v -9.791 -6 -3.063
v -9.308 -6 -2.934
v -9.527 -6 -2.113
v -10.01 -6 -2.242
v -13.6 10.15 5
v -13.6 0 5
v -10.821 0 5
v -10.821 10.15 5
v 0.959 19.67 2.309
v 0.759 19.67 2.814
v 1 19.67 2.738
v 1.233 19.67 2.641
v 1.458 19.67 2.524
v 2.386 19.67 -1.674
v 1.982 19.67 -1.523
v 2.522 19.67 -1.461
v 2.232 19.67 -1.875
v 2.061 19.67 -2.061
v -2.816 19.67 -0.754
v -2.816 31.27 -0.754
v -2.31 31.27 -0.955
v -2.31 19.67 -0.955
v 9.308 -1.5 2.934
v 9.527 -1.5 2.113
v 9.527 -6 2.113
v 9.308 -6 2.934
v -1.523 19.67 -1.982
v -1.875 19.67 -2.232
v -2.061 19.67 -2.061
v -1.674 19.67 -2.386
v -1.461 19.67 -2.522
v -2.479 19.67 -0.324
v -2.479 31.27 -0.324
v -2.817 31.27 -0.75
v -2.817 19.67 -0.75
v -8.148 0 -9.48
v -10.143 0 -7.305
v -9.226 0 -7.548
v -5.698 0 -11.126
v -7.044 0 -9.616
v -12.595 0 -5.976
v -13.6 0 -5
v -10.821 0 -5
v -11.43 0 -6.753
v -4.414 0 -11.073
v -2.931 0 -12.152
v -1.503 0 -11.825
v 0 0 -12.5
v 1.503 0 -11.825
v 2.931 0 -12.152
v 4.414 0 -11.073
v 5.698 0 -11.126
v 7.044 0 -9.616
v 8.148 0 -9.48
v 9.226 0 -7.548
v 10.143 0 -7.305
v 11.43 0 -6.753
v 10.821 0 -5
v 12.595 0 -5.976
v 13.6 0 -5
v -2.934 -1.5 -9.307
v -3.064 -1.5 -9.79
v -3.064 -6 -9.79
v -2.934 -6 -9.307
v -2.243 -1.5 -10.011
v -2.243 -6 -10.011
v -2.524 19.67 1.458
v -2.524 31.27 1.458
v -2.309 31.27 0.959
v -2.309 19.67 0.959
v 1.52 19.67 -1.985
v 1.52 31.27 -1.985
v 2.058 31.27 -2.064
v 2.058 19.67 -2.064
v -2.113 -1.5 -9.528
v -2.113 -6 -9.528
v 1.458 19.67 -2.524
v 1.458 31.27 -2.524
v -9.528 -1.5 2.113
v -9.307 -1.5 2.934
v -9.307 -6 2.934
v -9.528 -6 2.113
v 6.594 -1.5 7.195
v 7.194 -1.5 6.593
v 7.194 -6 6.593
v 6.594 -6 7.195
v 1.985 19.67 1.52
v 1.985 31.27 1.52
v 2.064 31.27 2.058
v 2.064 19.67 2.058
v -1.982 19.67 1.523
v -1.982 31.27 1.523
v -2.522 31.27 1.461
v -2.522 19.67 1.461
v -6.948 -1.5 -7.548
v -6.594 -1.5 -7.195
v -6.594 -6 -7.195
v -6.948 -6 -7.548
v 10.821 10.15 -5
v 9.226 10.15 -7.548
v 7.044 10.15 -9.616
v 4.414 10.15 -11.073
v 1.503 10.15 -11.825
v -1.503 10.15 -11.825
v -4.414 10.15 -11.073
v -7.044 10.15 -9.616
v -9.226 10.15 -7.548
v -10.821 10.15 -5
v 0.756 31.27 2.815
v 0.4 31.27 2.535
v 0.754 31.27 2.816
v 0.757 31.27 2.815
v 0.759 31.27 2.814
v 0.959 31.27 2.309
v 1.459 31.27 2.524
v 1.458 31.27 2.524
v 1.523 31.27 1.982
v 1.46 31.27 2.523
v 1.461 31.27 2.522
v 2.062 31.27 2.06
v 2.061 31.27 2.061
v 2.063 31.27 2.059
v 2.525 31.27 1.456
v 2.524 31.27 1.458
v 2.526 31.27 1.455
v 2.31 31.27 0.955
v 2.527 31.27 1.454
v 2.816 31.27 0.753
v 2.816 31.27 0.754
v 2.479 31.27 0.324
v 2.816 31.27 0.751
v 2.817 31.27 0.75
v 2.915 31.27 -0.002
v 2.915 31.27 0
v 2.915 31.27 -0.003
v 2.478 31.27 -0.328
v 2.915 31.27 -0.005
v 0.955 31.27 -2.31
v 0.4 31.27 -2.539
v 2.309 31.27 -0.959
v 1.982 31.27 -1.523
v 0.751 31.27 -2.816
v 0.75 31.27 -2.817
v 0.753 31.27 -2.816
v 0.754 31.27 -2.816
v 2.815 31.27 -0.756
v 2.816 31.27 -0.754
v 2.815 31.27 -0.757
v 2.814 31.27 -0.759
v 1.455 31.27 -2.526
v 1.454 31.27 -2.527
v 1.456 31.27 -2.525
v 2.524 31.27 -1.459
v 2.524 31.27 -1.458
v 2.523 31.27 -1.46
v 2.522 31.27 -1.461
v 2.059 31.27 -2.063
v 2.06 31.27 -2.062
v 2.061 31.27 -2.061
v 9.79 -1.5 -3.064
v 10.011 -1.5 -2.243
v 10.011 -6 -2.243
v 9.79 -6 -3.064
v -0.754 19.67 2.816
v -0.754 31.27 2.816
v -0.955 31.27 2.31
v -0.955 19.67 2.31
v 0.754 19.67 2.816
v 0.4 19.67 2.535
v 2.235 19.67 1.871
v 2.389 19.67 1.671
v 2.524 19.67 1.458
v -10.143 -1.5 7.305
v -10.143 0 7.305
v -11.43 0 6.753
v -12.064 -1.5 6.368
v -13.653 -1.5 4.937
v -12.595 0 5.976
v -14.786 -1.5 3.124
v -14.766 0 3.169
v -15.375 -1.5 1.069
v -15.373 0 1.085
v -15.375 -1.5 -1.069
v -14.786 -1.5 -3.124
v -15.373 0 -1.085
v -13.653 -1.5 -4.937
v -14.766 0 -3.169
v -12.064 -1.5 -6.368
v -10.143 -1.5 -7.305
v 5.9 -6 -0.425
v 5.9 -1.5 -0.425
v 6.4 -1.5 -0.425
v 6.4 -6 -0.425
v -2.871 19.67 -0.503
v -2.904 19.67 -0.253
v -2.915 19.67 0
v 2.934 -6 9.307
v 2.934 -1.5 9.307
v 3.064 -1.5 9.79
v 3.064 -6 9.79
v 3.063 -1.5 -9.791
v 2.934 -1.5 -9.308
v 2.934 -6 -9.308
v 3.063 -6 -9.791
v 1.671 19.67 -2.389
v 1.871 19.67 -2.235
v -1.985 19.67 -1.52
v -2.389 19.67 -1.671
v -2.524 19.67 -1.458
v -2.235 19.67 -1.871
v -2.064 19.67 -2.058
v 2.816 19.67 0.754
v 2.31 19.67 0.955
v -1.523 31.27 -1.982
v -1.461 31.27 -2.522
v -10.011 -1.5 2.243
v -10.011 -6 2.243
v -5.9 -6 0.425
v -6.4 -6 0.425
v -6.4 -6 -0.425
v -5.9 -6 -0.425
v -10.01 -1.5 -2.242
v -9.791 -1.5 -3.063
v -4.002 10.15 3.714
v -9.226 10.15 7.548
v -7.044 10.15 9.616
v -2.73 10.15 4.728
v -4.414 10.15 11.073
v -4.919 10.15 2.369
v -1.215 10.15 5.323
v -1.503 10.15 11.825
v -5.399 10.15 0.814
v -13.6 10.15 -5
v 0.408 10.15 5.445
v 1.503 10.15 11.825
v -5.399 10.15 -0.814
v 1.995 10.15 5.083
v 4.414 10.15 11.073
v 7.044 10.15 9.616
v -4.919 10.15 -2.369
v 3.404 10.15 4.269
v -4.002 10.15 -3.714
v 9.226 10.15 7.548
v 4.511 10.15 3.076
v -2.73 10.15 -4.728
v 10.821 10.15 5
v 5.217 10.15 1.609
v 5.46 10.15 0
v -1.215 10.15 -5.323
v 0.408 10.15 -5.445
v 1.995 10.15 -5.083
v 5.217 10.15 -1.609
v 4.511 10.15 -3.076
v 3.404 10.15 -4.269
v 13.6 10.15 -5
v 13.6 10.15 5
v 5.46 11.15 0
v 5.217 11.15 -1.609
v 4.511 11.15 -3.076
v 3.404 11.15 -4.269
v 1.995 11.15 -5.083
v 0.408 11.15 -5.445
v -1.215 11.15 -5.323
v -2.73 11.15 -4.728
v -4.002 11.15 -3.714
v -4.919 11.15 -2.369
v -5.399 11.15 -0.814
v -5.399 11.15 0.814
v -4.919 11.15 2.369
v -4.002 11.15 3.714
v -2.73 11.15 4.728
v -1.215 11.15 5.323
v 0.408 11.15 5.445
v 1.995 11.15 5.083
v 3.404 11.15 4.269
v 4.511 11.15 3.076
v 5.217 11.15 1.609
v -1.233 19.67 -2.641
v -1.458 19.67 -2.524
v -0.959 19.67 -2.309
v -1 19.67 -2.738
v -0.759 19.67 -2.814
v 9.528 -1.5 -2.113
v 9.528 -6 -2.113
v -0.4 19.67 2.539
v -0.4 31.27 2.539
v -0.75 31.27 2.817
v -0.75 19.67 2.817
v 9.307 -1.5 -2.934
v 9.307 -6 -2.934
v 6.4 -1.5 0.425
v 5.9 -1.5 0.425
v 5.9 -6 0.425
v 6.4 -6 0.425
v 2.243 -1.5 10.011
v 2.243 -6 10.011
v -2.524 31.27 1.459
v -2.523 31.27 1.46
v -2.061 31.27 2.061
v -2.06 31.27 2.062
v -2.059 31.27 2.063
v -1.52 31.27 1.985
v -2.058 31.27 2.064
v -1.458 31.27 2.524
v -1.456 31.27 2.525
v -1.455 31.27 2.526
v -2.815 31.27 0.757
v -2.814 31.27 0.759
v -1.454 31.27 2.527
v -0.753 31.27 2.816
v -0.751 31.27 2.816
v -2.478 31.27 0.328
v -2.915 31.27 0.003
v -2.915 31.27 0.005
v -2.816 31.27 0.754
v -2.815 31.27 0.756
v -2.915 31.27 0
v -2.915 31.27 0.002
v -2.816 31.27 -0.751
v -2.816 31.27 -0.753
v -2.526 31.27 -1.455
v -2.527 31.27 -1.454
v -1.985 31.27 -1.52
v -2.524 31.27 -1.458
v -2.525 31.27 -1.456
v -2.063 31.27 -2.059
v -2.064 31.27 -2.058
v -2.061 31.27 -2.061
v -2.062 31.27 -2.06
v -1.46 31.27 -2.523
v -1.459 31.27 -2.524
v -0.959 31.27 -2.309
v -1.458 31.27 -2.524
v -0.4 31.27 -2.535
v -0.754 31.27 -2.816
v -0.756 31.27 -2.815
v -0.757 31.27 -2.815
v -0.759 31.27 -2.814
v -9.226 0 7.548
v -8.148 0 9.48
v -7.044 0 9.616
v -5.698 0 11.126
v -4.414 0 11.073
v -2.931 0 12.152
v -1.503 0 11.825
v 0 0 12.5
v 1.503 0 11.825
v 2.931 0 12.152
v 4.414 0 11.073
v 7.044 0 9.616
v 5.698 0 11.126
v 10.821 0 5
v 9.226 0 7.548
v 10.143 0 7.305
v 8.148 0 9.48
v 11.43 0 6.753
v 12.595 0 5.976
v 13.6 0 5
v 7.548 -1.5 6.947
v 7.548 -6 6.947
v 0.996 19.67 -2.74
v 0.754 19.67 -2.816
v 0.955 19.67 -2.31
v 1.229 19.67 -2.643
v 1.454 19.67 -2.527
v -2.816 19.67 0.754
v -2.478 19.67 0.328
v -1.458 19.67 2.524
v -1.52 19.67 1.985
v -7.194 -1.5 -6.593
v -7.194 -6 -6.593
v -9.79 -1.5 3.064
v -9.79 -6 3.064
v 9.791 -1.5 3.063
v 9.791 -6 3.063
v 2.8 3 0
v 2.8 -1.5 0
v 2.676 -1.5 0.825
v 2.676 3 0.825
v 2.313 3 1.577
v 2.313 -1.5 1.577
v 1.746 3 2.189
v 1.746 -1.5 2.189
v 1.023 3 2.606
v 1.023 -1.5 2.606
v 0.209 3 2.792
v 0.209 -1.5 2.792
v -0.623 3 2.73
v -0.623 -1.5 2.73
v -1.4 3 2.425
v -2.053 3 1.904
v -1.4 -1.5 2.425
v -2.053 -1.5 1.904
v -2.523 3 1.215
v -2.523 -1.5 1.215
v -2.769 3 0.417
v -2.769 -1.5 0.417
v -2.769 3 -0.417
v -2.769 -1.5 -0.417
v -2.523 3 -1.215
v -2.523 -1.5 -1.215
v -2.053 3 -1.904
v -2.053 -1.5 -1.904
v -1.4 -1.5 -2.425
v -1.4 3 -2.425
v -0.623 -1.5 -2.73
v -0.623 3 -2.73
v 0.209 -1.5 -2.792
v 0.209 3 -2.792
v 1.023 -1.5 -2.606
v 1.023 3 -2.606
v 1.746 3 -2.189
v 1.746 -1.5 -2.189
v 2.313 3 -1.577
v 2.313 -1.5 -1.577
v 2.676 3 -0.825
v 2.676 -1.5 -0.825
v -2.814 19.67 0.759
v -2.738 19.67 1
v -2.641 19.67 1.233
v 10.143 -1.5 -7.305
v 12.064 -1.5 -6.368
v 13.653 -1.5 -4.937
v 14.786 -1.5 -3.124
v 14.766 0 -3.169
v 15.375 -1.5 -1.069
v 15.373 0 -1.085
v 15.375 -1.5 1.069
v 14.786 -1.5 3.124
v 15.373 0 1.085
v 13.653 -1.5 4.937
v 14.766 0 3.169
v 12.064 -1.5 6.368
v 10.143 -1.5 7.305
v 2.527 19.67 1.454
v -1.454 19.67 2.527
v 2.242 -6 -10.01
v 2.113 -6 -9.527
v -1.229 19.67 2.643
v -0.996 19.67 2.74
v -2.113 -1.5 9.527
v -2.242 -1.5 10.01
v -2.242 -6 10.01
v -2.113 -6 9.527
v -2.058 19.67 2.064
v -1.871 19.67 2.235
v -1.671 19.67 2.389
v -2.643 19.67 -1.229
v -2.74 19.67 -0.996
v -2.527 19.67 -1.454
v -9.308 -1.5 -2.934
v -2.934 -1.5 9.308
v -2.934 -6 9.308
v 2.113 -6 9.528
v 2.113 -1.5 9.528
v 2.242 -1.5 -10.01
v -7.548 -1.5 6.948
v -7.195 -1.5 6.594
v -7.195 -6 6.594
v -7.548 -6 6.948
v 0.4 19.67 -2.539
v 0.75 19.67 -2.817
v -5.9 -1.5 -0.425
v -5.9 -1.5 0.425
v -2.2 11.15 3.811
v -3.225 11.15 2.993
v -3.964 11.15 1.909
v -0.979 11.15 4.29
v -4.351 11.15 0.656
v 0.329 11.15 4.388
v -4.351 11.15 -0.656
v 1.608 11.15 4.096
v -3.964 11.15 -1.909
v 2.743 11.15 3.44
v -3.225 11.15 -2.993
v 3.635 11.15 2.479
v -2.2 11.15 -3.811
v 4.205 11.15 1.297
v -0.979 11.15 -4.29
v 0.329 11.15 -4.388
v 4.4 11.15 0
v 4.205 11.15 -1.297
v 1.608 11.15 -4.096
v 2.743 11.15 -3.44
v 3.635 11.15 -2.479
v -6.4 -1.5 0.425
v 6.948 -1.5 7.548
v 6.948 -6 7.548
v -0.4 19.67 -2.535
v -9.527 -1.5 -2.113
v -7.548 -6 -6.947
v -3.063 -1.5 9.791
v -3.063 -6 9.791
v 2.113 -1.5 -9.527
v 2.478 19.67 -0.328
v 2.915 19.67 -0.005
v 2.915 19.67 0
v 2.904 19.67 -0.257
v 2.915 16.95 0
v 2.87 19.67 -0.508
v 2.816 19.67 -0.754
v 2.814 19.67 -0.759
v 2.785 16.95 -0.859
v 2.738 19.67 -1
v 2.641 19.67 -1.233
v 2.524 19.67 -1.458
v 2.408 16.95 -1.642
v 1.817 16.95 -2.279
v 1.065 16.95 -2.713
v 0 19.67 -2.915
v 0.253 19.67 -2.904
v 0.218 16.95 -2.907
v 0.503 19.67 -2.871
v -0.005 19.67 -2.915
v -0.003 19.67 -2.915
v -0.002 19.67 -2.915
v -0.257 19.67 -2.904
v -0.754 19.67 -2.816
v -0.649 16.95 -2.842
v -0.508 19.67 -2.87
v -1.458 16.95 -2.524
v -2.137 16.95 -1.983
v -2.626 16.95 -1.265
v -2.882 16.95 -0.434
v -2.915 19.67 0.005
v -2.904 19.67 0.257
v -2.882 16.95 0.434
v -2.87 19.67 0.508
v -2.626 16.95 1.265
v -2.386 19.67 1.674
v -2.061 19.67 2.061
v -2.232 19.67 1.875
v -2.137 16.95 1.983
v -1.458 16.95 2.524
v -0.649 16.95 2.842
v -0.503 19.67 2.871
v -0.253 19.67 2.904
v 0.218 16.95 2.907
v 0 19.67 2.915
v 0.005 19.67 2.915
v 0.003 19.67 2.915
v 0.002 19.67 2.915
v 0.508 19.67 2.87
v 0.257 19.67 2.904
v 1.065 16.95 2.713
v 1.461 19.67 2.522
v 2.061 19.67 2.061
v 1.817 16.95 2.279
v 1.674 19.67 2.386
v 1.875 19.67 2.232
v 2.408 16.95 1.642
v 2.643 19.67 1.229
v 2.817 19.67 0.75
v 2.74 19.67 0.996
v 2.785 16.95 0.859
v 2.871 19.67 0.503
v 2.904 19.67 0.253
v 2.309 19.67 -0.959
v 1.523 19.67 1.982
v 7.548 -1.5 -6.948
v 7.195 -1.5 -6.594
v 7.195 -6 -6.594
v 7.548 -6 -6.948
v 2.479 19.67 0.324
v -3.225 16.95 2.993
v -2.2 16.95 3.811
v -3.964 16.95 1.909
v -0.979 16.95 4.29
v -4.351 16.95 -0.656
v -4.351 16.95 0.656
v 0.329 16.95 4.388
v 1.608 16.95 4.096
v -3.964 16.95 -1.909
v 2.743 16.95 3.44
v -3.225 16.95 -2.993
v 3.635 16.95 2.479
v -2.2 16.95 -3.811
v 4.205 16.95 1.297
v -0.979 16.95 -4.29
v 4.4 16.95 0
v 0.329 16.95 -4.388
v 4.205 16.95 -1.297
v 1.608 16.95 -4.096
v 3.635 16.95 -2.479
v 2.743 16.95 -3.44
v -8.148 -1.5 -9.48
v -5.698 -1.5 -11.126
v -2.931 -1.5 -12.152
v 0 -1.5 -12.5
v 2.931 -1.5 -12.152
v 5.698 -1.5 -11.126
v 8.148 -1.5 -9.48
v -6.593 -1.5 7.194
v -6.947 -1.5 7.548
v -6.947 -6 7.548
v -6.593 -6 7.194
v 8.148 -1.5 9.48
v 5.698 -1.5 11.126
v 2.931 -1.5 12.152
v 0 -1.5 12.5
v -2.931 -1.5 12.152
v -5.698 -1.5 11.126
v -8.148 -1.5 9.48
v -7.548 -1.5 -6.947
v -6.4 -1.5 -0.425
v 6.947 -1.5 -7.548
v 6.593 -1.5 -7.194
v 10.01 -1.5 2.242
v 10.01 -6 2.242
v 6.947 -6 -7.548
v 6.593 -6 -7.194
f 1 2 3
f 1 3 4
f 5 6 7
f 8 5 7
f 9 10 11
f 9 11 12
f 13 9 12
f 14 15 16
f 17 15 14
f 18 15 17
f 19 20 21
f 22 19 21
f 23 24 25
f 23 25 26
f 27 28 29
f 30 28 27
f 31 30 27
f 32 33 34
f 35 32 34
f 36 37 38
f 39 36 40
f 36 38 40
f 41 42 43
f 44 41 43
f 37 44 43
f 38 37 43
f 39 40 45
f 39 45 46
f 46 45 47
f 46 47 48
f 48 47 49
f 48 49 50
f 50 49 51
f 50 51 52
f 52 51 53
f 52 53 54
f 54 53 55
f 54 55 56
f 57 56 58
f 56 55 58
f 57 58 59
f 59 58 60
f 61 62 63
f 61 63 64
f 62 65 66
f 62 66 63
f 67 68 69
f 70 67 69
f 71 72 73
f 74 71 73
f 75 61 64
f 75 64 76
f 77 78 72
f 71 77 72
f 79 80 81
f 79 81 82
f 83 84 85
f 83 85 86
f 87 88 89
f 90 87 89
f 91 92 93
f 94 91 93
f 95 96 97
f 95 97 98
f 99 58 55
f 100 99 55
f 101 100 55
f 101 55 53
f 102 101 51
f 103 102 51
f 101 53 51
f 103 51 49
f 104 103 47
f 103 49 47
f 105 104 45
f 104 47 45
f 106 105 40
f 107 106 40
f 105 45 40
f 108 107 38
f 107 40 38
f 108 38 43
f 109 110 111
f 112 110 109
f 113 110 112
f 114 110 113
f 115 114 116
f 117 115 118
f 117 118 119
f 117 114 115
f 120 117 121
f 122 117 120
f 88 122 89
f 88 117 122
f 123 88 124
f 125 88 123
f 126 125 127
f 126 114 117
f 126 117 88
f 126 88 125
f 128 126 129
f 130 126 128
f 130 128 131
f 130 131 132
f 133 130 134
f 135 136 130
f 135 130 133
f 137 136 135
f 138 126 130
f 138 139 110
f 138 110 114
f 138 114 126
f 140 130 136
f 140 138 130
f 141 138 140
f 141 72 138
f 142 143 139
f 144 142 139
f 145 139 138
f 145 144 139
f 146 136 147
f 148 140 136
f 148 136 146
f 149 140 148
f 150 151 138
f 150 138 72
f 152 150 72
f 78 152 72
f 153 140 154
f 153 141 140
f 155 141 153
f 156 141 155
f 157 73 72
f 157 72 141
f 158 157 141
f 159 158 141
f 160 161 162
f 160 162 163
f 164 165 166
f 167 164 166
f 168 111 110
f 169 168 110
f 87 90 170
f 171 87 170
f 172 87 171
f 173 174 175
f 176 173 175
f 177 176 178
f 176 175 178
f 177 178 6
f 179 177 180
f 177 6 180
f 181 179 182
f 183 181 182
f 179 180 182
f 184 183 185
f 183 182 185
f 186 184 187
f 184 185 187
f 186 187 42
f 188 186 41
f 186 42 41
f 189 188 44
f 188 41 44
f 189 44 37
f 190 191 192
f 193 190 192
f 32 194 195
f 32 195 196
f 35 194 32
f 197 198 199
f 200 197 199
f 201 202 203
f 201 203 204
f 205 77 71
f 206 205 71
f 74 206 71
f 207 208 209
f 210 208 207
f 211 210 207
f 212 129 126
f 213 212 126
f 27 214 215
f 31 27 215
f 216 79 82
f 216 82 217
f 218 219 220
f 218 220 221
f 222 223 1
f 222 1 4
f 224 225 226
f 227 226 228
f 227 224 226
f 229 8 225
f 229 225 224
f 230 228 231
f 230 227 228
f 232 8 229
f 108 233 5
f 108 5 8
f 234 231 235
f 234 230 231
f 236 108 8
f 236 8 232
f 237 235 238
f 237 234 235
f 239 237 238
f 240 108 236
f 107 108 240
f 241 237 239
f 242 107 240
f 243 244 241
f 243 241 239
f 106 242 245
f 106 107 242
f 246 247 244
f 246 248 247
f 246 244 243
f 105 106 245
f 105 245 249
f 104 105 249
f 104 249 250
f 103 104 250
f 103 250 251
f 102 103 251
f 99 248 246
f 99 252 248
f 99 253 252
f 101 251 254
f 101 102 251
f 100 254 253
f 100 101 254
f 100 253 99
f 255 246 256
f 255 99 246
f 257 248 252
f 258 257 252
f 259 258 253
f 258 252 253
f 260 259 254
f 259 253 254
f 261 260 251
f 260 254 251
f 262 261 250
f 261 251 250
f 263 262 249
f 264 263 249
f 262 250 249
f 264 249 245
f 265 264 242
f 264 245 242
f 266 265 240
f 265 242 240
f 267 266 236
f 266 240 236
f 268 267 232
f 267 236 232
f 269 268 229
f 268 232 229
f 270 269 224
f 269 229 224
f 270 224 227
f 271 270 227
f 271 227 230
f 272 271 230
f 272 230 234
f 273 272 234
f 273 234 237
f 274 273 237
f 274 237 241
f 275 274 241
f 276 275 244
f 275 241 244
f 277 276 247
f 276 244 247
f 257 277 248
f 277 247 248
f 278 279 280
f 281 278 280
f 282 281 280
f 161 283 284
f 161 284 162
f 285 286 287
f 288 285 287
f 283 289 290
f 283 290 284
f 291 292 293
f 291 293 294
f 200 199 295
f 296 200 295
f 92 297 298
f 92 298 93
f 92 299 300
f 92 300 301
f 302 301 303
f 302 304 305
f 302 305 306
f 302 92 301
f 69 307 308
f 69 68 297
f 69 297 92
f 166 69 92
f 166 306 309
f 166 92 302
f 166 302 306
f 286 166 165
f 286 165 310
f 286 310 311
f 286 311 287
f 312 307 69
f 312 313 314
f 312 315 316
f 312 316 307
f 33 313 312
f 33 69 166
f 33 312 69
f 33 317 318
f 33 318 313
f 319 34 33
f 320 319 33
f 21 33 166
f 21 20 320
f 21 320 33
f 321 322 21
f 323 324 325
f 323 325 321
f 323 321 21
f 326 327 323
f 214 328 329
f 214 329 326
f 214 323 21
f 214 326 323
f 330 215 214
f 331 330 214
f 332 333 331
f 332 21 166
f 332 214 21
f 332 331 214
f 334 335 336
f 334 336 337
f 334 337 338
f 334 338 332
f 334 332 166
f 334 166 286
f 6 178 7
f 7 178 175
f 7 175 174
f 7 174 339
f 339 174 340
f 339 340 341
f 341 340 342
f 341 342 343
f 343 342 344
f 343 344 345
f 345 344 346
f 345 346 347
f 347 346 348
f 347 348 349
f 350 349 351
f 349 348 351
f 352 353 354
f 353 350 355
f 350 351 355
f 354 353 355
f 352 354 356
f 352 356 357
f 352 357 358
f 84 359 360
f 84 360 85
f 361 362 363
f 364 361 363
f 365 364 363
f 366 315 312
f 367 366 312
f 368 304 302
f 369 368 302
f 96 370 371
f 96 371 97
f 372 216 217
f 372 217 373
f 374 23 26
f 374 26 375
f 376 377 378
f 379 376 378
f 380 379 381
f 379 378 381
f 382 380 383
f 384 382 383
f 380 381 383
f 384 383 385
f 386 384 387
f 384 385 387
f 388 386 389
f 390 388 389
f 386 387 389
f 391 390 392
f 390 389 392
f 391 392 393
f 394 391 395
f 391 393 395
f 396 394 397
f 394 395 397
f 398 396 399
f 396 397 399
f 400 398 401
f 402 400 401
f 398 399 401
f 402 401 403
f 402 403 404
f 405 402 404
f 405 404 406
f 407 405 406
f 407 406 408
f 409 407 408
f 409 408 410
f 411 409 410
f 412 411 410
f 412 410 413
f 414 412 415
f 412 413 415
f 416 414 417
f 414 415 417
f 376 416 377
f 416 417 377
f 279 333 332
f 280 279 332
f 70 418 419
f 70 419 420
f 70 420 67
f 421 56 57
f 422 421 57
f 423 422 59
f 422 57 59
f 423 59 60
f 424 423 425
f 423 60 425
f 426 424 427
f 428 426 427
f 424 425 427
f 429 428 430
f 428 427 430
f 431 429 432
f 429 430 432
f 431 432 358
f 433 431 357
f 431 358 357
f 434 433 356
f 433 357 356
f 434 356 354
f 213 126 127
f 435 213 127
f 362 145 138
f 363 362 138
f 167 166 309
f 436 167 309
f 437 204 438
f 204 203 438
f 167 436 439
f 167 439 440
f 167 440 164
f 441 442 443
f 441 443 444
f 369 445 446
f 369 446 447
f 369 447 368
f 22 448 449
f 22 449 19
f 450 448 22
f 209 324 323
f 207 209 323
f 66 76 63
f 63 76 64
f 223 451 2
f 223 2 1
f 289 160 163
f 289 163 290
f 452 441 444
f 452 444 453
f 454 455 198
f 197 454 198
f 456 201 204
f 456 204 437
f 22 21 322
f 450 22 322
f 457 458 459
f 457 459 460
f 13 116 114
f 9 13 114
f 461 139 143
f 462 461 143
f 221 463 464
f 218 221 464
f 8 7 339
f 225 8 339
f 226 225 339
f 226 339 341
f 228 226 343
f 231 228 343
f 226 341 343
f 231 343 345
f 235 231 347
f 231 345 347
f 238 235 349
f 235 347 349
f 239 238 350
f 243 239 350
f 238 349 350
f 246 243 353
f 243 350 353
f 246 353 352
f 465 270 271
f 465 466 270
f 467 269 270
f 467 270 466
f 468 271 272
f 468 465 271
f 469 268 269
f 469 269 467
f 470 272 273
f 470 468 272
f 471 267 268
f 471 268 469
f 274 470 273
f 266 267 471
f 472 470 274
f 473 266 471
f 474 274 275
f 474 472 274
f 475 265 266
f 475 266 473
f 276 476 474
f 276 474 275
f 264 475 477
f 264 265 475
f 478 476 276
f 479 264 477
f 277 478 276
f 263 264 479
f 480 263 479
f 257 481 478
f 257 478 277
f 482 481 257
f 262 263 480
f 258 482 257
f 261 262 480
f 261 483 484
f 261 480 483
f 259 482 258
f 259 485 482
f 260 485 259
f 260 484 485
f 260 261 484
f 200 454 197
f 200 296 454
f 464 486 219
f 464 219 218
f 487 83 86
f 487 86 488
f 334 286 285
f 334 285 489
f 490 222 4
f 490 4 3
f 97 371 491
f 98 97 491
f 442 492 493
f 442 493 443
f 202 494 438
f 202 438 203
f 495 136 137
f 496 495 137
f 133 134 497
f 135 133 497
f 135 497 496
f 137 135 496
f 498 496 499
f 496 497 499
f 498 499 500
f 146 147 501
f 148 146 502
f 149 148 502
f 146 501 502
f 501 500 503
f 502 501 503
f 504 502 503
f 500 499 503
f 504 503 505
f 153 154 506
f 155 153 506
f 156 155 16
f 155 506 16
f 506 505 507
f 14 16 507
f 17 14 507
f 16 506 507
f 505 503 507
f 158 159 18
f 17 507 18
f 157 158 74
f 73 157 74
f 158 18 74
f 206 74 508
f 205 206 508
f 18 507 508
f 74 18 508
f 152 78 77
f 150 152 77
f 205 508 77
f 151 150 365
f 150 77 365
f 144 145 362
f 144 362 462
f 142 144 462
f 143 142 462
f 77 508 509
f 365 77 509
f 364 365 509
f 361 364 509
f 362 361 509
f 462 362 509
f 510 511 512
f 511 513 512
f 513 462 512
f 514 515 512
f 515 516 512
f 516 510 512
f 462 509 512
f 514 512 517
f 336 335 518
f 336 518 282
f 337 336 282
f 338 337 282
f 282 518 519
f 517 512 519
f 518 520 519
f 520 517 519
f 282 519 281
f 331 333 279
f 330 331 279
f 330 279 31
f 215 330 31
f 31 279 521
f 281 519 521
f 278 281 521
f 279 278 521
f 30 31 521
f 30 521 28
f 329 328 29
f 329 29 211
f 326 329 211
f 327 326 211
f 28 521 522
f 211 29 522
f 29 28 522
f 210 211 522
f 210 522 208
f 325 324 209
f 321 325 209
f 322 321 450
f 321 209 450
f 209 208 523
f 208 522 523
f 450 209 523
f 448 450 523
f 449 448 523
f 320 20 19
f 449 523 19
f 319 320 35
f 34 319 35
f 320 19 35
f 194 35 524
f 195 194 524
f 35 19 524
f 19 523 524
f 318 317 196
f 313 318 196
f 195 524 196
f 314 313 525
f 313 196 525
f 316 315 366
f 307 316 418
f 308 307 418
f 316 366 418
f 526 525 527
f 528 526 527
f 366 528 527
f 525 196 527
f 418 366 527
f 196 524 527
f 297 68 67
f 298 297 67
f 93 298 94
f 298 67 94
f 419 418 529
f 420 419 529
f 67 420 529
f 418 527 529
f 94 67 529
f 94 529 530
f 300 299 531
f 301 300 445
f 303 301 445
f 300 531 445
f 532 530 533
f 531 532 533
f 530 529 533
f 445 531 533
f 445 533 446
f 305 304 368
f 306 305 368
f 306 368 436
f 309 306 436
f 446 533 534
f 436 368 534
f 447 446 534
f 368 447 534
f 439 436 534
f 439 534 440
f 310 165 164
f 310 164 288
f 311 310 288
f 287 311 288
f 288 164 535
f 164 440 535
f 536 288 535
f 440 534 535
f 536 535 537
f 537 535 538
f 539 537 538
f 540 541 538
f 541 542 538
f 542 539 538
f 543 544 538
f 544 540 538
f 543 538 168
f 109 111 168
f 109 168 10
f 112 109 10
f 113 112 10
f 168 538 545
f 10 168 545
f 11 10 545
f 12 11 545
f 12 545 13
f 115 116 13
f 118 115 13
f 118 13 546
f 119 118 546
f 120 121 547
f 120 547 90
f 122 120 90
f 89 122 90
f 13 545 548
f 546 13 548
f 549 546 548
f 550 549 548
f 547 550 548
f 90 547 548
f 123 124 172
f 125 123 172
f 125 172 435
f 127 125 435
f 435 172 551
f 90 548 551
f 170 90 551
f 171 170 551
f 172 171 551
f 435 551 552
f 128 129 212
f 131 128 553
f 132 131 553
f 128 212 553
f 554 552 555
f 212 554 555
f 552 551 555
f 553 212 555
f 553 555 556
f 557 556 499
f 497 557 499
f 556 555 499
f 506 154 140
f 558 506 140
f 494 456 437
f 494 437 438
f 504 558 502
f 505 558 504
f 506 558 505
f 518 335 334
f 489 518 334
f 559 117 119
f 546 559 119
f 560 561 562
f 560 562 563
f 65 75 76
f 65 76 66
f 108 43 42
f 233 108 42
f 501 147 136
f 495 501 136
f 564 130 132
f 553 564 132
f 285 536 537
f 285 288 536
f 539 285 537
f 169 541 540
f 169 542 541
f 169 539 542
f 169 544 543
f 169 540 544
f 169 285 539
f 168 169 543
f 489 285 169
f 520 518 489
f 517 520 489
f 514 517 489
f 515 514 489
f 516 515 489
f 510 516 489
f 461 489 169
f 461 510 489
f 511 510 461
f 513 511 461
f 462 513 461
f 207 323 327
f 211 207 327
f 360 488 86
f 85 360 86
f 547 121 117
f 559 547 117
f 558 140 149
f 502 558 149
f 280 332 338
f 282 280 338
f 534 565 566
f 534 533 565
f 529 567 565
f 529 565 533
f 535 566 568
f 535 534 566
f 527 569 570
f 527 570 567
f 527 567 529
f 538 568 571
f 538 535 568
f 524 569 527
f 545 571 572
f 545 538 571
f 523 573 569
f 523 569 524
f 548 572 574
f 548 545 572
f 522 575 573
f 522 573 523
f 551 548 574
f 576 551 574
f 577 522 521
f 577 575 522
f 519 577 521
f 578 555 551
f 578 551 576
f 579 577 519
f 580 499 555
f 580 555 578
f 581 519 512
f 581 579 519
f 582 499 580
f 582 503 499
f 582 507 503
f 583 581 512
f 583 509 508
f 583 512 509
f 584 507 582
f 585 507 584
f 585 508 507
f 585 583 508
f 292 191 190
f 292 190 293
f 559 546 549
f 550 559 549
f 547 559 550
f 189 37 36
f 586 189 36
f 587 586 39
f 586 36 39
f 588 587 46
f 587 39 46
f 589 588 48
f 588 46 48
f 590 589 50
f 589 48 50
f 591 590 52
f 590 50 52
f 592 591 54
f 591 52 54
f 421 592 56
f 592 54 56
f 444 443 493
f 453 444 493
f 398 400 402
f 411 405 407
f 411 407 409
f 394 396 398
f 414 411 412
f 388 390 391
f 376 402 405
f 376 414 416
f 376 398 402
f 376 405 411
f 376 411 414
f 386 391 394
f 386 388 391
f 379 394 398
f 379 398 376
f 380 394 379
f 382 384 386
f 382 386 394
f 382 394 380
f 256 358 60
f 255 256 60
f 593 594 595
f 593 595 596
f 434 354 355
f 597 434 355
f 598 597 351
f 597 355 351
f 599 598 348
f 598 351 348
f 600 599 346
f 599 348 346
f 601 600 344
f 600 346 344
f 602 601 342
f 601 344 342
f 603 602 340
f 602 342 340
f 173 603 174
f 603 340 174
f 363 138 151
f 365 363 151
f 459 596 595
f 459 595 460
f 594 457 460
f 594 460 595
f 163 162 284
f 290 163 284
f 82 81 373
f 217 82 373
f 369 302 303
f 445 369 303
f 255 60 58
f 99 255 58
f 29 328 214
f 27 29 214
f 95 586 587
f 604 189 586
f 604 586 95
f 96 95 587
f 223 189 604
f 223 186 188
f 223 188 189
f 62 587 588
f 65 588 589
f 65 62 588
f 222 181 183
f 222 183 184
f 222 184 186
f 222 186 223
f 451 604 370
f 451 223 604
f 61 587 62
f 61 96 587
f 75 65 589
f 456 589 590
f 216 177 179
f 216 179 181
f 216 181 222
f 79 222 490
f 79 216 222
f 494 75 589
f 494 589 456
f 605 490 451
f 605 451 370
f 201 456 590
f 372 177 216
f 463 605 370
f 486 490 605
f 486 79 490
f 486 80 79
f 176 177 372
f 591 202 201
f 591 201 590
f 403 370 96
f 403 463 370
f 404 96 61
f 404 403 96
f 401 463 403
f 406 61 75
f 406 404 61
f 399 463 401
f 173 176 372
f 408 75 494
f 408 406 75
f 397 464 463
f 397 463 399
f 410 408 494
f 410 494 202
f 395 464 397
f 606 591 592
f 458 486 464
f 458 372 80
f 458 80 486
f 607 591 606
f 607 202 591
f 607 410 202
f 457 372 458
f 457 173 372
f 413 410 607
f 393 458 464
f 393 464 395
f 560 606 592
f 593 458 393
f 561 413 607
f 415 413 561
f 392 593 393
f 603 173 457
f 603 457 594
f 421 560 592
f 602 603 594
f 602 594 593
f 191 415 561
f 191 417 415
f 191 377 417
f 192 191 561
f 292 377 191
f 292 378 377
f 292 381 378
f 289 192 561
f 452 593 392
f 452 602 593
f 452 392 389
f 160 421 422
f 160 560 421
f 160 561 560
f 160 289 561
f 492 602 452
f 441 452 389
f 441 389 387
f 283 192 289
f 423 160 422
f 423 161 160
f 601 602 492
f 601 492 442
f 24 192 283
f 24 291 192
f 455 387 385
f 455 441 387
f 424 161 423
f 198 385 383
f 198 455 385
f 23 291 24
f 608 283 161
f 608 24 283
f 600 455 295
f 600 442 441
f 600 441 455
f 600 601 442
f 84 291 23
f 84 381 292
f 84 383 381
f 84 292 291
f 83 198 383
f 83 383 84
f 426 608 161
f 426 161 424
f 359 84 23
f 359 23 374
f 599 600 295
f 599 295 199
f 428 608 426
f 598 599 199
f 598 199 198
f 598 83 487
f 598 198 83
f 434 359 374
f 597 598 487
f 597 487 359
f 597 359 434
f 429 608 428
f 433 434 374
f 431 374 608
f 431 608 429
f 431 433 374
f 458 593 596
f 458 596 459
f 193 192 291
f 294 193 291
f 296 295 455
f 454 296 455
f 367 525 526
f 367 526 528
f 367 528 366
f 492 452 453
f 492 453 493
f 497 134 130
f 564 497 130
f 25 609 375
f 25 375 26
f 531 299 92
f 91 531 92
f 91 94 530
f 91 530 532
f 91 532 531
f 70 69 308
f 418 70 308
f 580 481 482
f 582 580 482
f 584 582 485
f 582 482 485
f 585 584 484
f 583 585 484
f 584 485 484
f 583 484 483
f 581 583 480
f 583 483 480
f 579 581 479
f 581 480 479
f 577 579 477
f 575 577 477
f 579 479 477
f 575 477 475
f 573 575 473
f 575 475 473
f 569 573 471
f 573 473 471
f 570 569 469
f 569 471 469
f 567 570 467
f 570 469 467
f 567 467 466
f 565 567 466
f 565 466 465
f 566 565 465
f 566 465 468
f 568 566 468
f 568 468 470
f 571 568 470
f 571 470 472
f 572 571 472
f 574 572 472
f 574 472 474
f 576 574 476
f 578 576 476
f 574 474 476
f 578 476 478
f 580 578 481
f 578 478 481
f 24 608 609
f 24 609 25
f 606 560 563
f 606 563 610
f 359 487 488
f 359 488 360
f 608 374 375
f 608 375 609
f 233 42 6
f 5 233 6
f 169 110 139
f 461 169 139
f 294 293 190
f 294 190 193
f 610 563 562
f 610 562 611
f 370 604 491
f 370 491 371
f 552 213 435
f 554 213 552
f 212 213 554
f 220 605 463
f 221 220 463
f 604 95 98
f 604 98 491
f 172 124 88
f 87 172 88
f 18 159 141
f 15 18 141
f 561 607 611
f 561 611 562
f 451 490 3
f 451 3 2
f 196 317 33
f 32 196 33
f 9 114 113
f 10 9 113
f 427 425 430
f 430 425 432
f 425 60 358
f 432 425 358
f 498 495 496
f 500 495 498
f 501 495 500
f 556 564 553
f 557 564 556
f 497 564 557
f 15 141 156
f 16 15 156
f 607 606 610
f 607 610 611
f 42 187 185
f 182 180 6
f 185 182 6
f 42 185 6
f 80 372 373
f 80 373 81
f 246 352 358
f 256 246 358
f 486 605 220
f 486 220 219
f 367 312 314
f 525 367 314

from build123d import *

# Parameters (mm, degrees)
BOSS_EXTRUDE1_DEPTH = 10.15
BOSS_EXTRUDE2_DEPTH = 1.5
SKETCH4_R           = 5.46
BOSS_EXTRUDE3_DEPTH = 1
SKETCH5_R           = 4.4
BOSS_EXTRUDE4_DEPTH = 5.8
SKETCH6_R           = 2.915
BOSS_EXTRUDE5_DEPTH = 14.32
BOSS_EXTRUDE6_DEPTH = 4.5
SKETCH8_W           = 0.5
SKETCH8_H           = 0.85
BOSS_EXTRUDE7_DEPTH = 4.5
SKETCH9_R           = 2.8
CUT_EXTRUDE1_DEPTH  = 4.5
CUT_EXTRUDE3_DEPTH  = 11.6
SKETCH10_W          = 0.8
SKETCH10_H          = 6.735502357
CUT_EXTRUDE2_DEPTH  = 11.6


with BuildPart() as part:
    # Sketch2 → Boss-Extrude1 (new body)
    with BuildSketch(Plane(origin=(0, 0, 0), x_dir=(1, 0, 0), z_dir=(0, 1, 0))):
        with BuildLine():
            Line((-13.6, 5), (-13.6, -5))
            Line((-13.6, -5), (-10.820646931, -5))
            ThreePointArc((-10.820646931, -5), (0, -11.92), (10.820646931, -5))
            Line((10.820646931, -5), (13.6, -5))
            Line((13.6, -5), (13.6, 5))
            Line((13.6, 5), (10.820646931, 5))
            ThreePointArc((10.820646931, 5), (0, 11.92), (-10.820646931, 5))
            Line((-10.820646931, 5), (-13.6, 5))
        make_face()
    extrude(amount=BOSS_EXTRUDE1_DEPTH)

    # Sketch3 → Boss-Extrude2 (add)
    with BuildSketch(Plane.XZ):
        with BuildLine():
            ThreePointArc((-10.142976429, -7.305479393), (0, -12.5), (10.142976429, -7.305479393))
            ThreePointArc((10.142976429, -7.305479393), (15.45, 0), (10.142976429, 7.305479393))
            ThreePointArc((10.142976429, 7.305479393), (0, 12.5), (-10.142976429, 7.305479393))
            ThreePointArc((-10.142976429, 7.305479393), (-15.45, 0), (-10.142976429, -7.305479393))
        make_face()
    extrude(amount=BOSS_EXTRUDE2_DEPTH)

    # Sketch4 → Boss-Extrude3 (add)
    with BuildSketch(Plane(origin=(0, 10.15, 0), x_dir=(1, 0, 0), z_dir=(0, 1, 0))):
        Circle(SKETCH4_R)
    extrude(amount=BOSS_EXTRUDE3_DEPTH)

    # Sketch5 → Boss-Extrude4 (add)
    with BuildSketch(Plane(origin=(0, 11.15, 0), x_dir=(1, 0, 0), z_dir=(0, 1, 0))):
        Circle(SKETCH5_R)
    extrude(amount=BOSS_EXTRUDE4_DEPTH)

    # Sketch6 → Boss-Extrude5 (add)
    with BuildSketch(Plane(origin=(0, 16.95, 0), x_dir=(1, 0, 0), z_dir=(0, 1, 0))):
        Circle(SKETCH6_R)
    extrude(amount=BOSS_EXTRUDE5_DEPTH)

    # Sketch7 → Boss-Extrude6 (add)
    with BuildSketch(Plane.XZ.offset(1.5)):
        Polygon((2.113087536, 9.528222971), (2.933883844, 9.307330641), (3.063820508, 9.790151999), (2.243024201, 10.011044329), align=None)
        Polygon((6.948038104, 7.548306607), (7.548422392, 6.946610084), (7.194483261, 6.593442855), (6.594098972, 7.195139378), align=None)
        Polygon((9.791330808, 3.063006225), (10.010430592, 2.241729606), (9.527326698, 2.11284738), (9.308226914, 2.934123999), align=None)
        Polygon((10.011044329, -2.243024201), (9.790151999, -3.063820508), (9.307330641, -2.933883844), (9.528222971, -2.113087536), align=None)
        Polygon((7.548306607, -6.948038104), (6.946610084, -7.548422392), (6.593442855, -7.194483261), (7.195139378, -6.594098972), align=None)
        Polygon((3.063006225, -9.791330808), (2.241729606, -10.010430592), (2.11284738, -9.527326698), (2.934123999, -9.308226914), align=None)
        Polygon((-2.243024201, -10.011044329), (-3.063820508, -9.790151999), (-2.933883844, -9.307330641), (-2.113087536, -9.528222971), align=None)
        Polygon((-6.948038104, -7.548306607), (-7.548422392, -6.946610084), (-7.194483261, -6.593442855), (-6.594098972, -7.195139378), align=None)
        Polygon((-9.791330808, -3.063006225), (-10.010430592, -2.241729606), (-9.527326698, -2.11284738), (-9.308226914, -2.934123999), align=None)
        Polygon((-10.011044329, 2.243024201), (-9.790151999, 3.063820508), (-9.307330641, 2.933883844), (-9.528222971, 2.113087536), align=None)
        Polygon((-7.548306607, 6.948038104), (-6.946610084, 7.548422392), (-6.593442855, 7.194483261), (-7.195139378, 6.594098972), align=None)
        Polygon((-3.063006225, 9.791330808), (-2.241729606, 10.010430592), (-2.11284738, 9.527326698), (-2.934123999, 9.308226914), align=None)
    extrude(amount=BOSS_EXTRUDE6_DEPTH)

    # Sketch8 → Boss-Extrude7 (add)
    with BuildSketch(Plane.XZ.offset(1.5)):
        with Locations((-6.15, 0)):
            Rectangle(SKETCH8_W, SKETCH8_H)
        with Locations((6.15, 0)):
            Rectangle(SKETCH8_W, SKETCH8_H)
    extrude(amount=BOSS_EXTRUDE7_DEPTH)

    # Sketch9 → Cut-Extrude1 (cut)
    with BuildSketch(Plane.XZ.offset(1.5)):
        Circle(SKETCH9_R)
    extrude(amount=-CUT_EXTRUDE1_DEPTH, mode=Mode.SUBTRACT)

    # Sketch11 → Cut-Extrude3 (cut)
    with BuildSketch(Plane(origin=(0, 31.27, 0), x_dir=(1, 0, 0), z_dir=(0, 1, 0))):
        with BuildLine():
            Line((-1.523472719, 1.982178316), (-1.461493827, 2.522153999))
            ThreePointArc((-1.461493827, 2.522153999), (-1.77636919, 2.311219916), (-2.061216267, 2.061216267))
            Line((-2.061216267, 2.061216267), (-1.523472719, 1.982178316))
        make_face()
        with BuildLine():
            Line((-0.958536146, 2.308940982), (-0.758913143, 2.814476122))
            ThreePointArc((-0.758913143, 2.814476122), (-1.117653146, 2.692225185), (-1.4575, 2.524464052))
            Line((-1.4575, 2.524464052), (-0.958536146, 2.308940982))
        make_face()
        with BuildLine():
            Line((-0.328276919, 2.478353136), (-0.004613782, 2.914996349))
            ThreePointArc((-0.004613782, 2.914996349), (-0.382770887, 2.889759756), (-0.754457516, 2.815673784))
            Line((-0.754457516, 2.815673784), (-0.328276919, 2.478353136))
        make_face()
        with BuildLine():
            ThreePointArc((0.75, 2.816864391), (0.378196575, 2.890361976), (0, 2.915))
            Line((0, 2.915), (0.324353838, 2.478869619))
            Line((0.324353838, 2.478869619), (0.75, 2.816864391))
        make_face()
        with BuildLine():
            ThreePointArc((1.453502522, 2.526767781), (1.113390566, 2.693990803), (0.754457516, 2.815673784))
            Line((0.754457516, 2.815673784), (0.954880417, 2.310455234))
            Line((0.954880417, 2.310455234), (1.453502522, 2.526767781))
        make_face()
        with BuildLine():
            ThreePointArc((2.057951249, 2.064476122), (1.77270883, 2.31402861), (1.4575, 2.524464052))
            Line((1.4575, 2.524464052), (1.520333473, 1.984587144))
            Line((1.520333473, 1.984587144), (2.057951249, 2.064476122))
        make_face()
        with BuildLine():
            ThreePointArc((2.522153999, 1.461493827), (2.311219916, 1.77636919), (2.061216267, 2.061216267))
            Line((2.061216267, 2.061216267), (1.982178316, 1.523472719))
            Line((1.982178316, 1.523472719), (2.522153999, 1.461493827))
        make_face()
        with BuildLine():
            ThreePointArc((2.814476122, 0.758913143), (2.692225185, 1.117653146), (2.524464052, 1.4575))
            Line((2.524464052, 1.4575), (2.308940982, 0.958536146))
            Line((2.308940982, 0.958536146), (2.814476122, 0.758913143))
        make_face()
        with BuildLine():
            ThreePointArc((2.914996349, 0.004613782), (2.889759756, 0.382770887), (2.815673784, 0.754457516))
            Line((2.815673784, 0.754457516), (2.478353136, 0.328276919))
            Line((2.478353136, 0.328276919), (2.914996349, 0.004613782))
        make_face()
        with BuildLine():
            ThreePointArc((2.816864391, -0.75), (2.890361976, -0.378196575), (2.915, 0))
            Line((2.915, 0), (2.478869619, -0.324353838))
            Line((2.478869619, -0.324353838), (2.816864391, -0.75))
        make_face()
        with BuildLine():
            ThreePointArc((2.526767781, -1.453502522), (2.693990803, -1.113390566), (2.815673784, -0.754457516))
            Line((2.815673784, -0.754457516), (2.310455234, -0.954880417))
            Line((2.310455234, -0.954880417), (2.526767781, -1.453502522))
        make_face()
        with BuildLine():
            ThreePointArc((2.064476122, -2.057951249), (2.31402861, -1.77270883), (2.524464052, -1.4575))
            Line((2.524464052, -1.4575), (1.984587144, -1.520333473))
            Line((1.984587144, -1.520333473), (2.064476122, -2.057951249))
        make_face()
        with BuildLine():
            ThreePointArc((1.461493827, -2.522153999), (1.77636919, -2.311219916), (2.061216267, -2.061216267))
            Line((2.061216267, -2.061216267), (1.523472719, -1.982178316))
            Line((1.523472719, -1.982178316), (1.461493827, -2.522153999))
        make_face()
        with BuildLine():
            ThreePointArc((0.758913143, -2.814476122), (1.117653146, -2.692225185), (1.4575, -2.524464052))
            Line((1.4575, -2.524464052), (0.958536146, -2.308940982))
            Line((0.958536146, -2.308940982), (0.758913143, -2.814476122))
        make_face()
        with BuildLine():
            ThreePointArc((0.004613782, -2.914996349), (0.382770887, -2.889759756), (0.754457516, -2.815673784))
            Line((0.754457516, -2.815673784), (0.328276919, -2.478353136))
            Line((0.328276919, -2.478353136), (0.004613782, -2.914996349))
        make_face()
        with BuildLine():
            Line((-0.324353838, -2.478869619), (-0.75, -2.816864391))
            ThreePointArc((-0.75, -2.816864391), (-0.378196575, -2.890361976), (0, -2.915))
            Line((0, -2.915), (-0.324353838, -2.478869619))
        make_face()
        with BuildLine():
            Line((-0.954880417, -2.310455234), (-1.453502522, -2.526767781))
            ThreePointArc((-1.453502522, -2.526767781), (-1.113390566, -2.693990803), (-0.754457516, -2.815673784))
            Line((-0.754457516, -2.815673784), (-0.954880417, -2.310455234))
        make_face()
        with BuildLine():
            Line((-1.520333473, -1.984587144), (-2.057951249, -2.064476122))
            ThreePointArc((-2.057951249, -2.064476122), (-1.77270883, -2.31402861), (-1.4575, -2.524464052))
            Line((-1.4575, -2.524464052), (-1.520333473, -1.984587144))
        make_face()
        with BuildLine():
            Line((-1.982178316, -1.523472719), (-2.522153999, -1.461493827))
            ThreePointArc((-2.522153999, -1.461493827), (-2.311219916, -1.77636919), (-2.061216267, -2.061216267))
            Line((-2.061216267, -2.061216267), (-1.982178316, -1.523472719))
        make_face()
        with BuildLine():
            Line((-2.308940982, -0.958536146), (-2.814476122, -0.758913143))
            ThreePointArc((-2.814476122, -0.758913143), (-2.692225185, -1.117653146), (-2.524464052, -1.4575))
            Line((-2.524464052, -1.4575), (-2.308940982, -0.958536146))
        make_face()
        with BuildLine():
            Line((-2.478353136, -0.328276919), (-2.914996349, -0.004613782))
            ThreePointArc((-2.914996349, -0.004613782), (-2.889759756, -0.382770887), (-2.815673784, -0.754457516))
            Line((-2.815673784, -0.754457516), (-2.478353136, -0.328276919))
        make_face()
        with BuildLine():
            Line((-2.478869619, 0.324353838), (-2.816864391, 0.75))
            ThreePointArc((-2.816864391, 0.75), (-2.890361976, 0.378196575), (-2.915, 0))
            Line((-2.915, 0), (-2.478869619, 0.324353838))
        make_face()
        with BuildLine():
            Line((-2.310455234, 0.954880417), (-2.526767781, 1.453502522))
            ThreePointArc((-2.526767781, 1.453502522), (-2.693990803, 1.113390566), (-2.815673784, 0.754457516))
            Line((-2.815673784, 0.754457516), (-2.310455234, 0.954880417))
        make_face()
        with BuildLine():
            Line((-1.984587144, 1.520333473), (-2.064476122, 2.057951249))
            ThreePointArc((-2.064476122, 2.057951249), (-2.31402861, 1.77270883), (-2.524464052, 1.4575))
            Line((-2.524464052, 1.4575), (-1.984587144, 1.520333473))
        make_face()
    extrude(amount=-CUT_EXTRUDE3_DEPTH, mode=Mode.SUBTRACT)

    # Sketch10 → Cut-Extrude2 (cut)
    with BuildSketch(Plane(origin=(0, 31.27, 0), x_dir=(1, 0, 0), z_dir=(0, 1, 0))):
        with Locations((0, 0.023459837)):
            Rectangle(SKETCH10_W, SKETCH10_H)
    extrude(amount=-CUT_EXTRUDE2_DEPTH, mode=Mode.SUBTRACT)


solid = part.part
